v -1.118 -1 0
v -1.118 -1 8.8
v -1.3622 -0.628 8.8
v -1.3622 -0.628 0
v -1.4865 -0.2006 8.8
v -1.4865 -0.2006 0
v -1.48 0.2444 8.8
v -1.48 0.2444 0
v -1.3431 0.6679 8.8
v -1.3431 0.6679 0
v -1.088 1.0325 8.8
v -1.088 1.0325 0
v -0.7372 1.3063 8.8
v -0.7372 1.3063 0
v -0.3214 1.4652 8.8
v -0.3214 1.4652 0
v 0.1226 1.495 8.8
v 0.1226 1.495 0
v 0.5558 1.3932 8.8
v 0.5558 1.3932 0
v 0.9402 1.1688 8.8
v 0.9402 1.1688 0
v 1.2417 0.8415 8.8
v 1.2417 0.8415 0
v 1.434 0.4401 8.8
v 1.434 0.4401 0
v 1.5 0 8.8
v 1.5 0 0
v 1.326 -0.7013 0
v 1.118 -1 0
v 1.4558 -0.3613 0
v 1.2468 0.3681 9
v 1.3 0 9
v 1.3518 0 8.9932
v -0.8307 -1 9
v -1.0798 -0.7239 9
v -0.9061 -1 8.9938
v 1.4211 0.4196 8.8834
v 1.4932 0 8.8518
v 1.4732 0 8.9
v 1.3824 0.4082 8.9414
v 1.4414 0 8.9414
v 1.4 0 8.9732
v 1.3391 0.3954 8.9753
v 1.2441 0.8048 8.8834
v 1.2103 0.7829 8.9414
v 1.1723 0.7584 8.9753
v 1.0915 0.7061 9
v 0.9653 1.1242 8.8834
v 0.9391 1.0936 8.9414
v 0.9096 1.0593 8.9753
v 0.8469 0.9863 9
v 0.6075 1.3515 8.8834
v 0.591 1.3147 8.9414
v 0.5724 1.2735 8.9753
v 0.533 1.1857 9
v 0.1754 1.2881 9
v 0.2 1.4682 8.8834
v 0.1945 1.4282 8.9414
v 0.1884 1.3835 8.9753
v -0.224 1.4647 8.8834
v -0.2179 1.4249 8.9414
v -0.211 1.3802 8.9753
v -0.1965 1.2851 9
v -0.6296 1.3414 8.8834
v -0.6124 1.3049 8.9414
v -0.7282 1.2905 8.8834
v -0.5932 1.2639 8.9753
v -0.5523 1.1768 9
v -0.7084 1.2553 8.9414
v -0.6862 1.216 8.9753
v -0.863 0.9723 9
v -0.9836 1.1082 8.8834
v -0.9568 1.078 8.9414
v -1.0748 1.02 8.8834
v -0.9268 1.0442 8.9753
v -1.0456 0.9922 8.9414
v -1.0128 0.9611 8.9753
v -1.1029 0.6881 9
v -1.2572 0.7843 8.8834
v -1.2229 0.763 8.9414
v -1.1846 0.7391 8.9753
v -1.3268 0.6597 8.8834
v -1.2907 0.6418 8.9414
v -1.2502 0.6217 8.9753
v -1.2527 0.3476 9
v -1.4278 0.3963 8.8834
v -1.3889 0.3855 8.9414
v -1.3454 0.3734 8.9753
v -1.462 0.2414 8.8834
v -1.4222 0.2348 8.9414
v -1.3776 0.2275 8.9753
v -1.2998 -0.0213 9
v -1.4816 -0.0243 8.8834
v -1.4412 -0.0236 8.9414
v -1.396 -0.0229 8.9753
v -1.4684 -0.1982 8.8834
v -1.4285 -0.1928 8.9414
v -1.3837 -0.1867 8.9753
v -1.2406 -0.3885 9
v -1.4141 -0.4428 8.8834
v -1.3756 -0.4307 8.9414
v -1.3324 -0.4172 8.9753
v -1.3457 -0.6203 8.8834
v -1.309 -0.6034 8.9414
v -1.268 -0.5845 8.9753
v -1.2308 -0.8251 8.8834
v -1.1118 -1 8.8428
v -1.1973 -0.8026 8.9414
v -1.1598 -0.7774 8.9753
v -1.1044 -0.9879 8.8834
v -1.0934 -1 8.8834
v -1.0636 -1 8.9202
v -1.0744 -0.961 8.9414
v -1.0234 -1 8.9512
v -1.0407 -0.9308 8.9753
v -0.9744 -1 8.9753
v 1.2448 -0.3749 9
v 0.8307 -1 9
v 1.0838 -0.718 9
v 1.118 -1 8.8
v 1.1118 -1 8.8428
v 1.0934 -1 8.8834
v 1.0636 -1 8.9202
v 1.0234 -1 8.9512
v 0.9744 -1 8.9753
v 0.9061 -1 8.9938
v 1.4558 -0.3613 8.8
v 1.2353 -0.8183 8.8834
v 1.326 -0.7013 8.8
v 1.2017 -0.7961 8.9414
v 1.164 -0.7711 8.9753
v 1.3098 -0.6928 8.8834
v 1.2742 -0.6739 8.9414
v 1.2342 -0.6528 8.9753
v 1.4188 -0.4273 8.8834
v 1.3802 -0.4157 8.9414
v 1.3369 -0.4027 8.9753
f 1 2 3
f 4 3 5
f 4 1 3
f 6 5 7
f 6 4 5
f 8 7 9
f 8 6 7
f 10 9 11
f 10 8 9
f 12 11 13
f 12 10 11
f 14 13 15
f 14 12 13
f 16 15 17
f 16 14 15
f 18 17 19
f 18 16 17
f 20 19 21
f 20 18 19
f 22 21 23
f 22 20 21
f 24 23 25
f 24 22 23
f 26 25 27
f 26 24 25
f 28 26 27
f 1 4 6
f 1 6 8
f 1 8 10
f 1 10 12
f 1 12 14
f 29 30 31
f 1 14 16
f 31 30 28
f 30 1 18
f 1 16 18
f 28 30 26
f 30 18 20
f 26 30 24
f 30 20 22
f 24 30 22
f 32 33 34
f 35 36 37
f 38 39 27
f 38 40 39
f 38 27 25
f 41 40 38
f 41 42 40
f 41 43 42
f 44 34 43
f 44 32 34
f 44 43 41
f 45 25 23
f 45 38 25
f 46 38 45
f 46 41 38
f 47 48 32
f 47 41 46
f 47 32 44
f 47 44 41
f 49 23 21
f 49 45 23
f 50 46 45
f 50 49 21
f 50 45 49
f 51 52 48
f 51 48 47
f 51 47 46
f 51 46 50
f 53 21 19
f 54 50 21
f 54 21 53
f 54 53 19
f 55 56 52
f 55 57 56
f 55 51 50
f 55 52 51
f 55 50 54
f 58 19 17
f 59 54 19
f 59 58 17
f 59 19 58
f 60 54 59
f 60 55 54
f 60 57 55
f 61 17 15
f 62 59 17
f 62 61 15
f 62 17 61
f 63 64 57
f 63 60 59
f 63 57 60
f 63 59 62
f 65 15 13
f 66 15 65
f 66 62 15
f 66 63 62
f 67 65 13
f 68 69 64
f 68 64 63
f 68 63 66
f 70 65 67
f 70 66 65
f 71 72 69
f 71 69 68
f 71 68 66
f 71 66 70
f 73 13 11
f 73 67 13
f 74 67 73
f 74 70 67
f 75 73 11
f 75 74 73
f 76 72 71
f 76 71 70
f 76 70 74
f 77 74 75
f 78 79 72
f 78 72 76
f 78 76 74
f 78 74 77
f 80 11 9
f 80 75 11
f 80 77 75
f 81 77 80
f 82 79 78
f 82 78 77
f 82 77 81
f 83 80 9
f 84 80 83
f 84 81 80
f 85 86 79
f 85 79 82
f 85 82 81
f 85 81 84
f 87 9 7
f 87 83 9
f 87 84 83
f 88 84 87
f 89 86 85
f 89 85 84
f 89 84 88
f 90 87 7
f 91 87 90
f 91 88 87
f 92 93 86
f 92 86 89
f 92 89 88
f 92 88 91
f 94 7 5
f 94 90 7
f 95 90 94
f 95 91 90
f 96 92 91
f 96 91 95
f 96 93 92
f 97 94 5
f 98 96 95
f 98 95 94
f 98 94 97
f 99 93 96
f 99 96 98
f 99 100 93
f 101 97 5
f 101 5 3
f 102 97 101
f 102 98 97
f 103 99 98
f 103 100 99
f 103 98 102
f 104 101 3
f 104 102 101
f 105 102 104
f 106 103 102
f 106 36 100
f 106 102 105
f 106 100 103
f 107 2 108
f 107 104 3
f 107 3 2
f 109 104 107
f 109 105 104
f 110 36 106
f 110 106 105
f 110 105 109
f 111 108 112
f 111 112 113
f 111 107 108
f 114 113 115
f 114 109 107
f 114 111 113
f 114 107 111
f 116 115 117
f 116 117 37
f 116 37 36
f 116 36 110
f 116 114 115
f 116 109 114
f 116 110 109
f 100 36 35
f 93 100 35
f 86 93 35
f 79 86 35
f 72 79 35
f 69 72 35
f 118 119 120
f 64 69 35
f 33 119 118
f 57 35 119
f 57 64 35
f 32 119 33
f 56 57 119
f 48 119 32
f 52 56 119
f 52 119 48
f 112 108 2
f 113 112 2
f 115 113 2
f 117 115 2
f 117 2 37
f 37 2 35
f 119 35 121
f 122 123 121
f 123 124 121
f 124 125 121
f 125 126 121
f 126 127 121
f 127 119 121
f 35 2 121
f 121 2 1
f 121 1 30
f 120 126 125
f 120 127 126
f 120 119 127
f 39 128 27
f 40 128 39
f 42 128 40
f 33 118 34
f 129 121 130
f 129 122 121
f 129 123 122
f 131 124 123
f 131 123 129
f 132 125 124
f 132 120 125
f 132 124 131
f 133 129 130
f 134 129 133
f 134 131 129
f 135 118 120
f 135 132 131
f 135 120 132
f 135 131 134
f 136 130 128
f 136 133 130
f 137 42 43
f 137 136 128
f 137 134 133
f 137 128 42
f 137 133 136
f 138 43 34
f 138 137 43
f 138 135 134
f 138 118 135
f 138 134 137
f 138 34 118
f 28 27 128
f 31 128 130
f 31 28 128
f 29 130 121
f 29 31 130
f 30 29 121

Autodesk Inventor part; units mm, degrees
ref_plane "YZ Plane" through (0, 0, 0) normal (1, 0, 0) x (0, 1, 0)
ref_plane "XZ Plane" through (0, 0, 0) normal (0, 1, 0) x (-1, 0, 0)
ref_plane "XY Plane" through (0, 0, 0) normal (0, 0, 1) x (1, 0, 0)
sketch "Esquisse2" plane through (0, 0, 0) normal (0, 0, 1) x (1, 0, 0)
  circle A0 centre (0, 0) radius 1.5
  line L0 (-1.118, -1) -> (1.118, -1)
  dimension "d2" = 3
  dimension "d3" = 0.5
extrude "Extrusion1" add sketch "Esquisse2" along normal blind 9 contours A0 L0 picked at (0.0594, -0.1702)
fillet "Congé1" radius 0.2 1 edges at (0, 1.5, 9)
properties part number "axe" material "Acier"
